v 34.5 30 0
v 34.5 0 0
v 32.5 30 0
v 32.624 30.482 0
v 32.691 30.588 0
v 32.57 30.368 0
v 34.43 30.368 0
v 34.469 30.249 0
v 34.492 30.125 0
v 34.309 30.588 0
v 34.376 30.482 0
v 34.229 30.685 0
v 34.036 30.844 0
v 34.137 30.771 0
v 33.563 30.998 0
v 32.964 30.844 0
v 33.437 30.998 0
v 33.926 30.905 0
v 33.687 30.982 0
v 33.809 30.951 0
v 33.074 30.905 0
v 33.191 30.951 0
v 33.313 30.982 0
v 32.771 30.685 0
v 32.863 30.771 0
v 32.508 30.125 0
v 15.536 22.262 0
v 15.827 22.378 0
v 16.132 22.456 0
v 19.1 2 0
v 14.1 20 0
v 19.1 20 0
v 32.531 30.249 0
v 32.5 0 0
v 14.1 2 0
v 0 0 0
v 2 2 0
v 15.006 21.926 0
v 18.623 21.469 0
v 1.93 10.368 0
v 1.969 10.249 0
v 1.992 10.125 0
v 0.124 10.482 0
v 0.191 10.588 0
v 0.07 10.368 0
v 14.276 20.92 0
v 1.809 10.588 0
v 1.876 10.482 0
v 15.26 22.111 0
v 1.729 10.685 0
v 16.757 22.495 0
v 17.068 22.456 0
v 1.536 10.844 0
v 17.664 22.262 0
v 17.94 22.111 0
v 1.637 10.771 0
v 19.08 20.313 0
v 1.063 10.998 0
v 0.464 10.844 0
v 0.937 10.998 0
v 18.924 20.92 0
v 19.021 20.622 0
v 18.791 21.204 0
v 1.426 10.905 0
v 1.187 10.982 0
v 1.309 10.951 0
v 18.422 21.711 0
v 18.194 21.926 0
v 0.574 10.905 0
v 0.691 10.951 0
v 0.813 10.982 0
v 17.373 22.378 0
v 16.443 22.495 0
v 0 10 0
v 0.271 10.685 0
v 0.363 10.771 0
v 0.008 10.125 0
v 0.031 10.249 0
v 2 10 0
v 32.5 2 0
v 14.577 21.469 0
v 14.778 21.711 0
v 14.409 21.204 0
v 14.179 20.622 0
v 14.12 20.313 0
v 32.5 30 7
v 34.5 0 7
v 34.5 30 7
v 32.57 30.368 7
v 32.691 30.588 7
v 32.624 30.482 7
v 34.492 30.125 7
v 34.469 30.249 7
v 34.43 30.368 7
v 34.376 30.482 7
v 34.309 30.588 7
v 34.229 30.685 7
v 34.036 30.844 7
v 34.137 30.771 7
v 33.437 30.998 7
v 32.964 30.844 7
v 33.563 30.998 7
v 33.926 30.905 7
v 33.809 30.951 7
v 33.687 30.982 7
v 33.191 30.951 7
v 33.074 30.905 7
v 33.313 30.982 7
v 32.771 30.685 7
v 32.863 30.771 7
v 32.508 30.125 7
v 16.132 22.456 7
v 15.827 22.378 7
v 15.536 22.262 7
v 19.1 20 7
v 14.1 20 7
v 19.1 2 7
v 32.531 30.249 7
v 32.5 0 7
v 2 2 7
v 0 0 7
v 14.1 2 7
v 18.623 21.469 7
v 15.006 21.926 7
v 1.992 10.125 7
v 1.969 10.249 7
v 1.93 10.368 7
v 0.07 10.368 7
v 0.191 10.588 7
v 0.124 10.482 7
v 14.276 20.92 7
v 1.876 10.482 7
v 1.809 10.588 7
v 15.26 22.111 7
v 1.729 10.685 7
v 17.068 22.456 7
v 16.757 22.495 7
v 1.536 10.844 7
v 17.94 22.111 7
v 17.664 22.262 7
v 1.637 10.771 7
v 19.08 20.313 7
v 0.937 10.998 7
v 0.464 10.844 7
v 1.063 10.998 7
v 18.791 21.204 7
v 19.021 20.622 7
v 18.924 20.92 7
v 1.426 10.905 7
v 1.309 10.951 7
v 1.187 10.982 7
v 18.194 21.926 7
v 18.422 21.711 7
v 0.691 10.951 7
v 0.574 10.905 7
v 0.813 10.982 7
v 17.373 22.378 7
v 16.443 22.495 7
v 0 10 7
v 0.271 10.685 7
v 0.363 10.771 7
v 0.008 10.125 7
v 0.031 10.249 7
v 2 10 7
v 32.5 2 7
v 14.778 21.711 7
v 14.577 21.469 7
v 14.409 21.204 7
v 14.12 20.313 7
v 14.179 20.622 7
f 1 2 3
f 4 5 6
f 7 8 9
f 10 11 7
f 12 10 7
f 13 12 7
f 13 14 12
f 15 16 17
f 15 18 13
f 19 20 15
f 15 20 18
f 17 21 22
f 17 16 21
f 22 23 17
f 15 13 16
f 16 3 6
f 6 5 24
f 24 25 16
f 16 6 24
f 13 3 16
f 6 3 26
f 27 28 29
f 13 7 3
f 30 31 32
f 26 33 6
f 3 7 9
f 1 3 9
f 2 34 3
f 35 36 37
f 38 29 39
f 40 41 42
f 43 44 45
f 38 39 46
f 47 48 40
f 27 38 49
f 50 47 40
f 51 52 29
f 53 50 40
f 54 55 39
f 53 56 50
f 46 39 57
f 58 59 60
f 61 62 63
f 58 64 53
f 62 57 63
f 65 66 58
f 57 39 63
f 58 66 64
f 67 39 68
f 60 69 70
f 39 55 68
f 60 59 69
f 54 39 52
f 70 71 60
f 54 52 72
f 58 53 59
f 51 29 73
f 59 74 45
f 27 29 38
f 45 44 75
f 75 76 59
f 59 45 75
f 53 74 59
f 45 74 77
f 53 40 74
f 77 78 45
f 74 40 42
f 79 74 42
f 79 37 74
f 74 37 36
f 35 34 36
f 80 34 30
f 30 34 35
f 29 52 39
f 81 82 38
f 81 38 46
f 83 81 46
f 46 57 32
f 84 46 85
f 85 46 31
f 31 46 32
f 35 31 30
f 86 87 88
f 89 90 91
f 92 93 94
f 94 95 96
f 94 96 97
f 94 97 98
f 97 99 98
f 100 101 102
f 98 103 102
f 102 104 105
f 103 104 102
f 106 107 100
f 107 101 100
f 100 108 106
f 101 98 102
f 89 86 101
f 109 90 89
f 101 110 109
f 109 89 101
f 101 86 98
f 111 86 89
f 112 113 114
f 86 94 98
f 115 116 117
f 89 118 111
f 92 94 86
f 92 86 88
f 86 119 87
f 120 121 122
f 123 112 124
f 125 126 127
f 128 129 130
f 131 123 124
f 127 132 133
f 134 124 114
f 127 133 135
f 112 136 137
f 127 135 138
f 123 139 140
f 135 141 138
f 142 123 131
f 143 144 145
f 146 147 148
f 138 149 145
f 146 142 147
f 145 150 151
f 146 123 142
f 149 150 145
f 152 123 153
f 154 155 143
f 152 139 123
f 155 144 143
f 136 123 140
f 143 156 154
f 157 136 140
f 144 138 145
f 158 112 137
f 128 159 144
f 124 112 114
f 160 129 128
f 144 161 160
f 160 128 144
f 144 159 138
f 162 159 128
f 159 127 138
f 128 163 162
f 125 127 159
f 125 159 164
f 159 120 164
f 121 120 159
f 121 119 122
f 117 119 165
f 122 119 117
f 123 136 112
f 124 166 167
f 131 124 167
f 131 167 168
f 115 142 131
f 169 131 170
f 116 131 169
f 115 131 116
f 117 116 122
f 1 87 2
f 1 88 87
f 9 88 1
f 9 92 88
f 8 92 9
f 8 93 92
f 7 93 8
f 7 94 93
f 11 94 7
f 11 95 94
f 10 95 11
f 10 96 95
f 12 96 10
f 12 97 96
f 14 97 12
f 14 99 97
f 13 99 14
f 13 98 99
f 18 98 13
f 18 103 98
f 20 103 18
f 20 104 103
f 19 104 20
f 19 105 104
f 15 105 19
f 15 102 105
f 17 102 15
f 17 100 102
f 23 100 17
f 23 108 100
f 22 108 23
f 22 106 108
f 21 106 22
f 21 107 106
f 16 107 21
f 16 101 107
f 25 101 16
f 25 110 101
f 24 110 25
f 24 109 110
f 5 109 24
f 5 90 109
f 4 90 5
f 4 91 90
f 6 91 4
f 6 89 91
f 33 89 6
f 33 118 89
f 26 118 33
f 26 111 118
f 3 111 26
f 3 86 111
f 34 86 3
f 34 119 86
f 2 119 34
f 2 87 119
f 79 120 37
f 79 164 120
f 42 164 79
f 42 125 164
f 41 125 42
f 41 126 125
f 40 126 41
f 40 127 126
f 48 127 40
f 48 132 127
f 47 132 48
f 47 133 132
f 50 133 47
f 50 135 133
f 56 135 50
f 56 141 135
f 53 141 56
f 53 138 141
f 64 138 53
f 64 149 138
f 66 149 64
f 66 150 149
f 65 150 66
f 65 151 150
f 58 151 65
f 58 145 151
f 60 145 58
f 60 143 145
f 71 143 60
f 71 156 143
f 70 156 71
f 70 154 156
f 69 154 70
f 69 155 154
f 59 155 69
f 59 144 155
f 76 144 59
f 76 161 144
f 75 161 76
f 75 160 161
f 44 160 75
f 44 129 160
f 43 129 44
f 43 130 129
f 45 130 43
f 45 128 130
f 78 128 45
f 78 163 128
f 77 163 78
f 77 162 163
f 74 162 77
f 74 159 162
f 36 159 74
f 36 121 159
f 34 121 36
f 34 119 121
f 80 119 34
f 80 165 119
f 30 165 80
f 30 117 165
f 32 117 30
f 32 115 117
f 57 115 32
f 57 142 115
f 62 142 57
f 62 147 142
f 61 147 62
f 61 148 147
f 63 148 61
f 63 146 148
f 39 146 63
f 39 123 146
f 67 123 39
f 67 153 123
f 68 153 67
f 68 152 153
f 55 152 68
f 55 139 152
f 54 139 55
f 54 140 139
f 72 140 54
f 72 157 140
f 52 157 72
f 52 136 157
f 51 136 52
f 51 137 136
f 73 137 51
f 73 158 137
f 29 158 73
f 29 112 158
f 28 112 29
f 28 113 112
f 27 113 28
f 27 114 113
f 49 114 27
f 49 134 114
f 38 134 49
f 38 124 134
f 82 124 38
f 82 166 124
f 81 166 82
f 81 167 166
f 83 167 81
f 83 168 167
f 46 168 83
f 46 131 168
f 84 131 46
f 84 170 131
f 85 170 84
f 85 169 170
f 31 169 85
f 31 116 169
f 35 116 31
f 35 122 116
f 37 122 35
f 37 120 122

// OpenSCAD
$fn=50;

// all units in mm
edge_thick = 2;
mid_thick = 5;
hub_thick = 12.1;
pi_thick = 13.4;
top_height = 10;
mid_height = 20;
bottom_height = 30;
depth = 7;

linear_extrude(height=depth) {
    difference() {
        square([edge_thick+hub_thick, top_height]);
        translate([edge_thick,edge_thick])
            square([hub_thick, top_height]);
    }
    translate([edge_thick+hub_thick, 0]) {
        difference() {
            square([mid_thick+pi_thick, mid_height]);
            translate([mid_thick, edge_thick])
                square([pi_thick, mid_height]);
        }
    }
    translate([edge_thick+hub_thick+mid_thick+pi_thick, 0]) {
        square([edge_thick, bottom_height]);
    }
    translate([edge_thick/2,top_height]) {
        circle(d=edge_thick);
    }
    translate([edge_thick+hub_thick+mid_thick/2,mid_height]) {
        circle(d=mid_thick);
    }
    translate([1.5*edge_thick+hub_thick+mid_thick+pi_thick,bottom_height]) {
        circle(d=edge_thick);
    }
}
